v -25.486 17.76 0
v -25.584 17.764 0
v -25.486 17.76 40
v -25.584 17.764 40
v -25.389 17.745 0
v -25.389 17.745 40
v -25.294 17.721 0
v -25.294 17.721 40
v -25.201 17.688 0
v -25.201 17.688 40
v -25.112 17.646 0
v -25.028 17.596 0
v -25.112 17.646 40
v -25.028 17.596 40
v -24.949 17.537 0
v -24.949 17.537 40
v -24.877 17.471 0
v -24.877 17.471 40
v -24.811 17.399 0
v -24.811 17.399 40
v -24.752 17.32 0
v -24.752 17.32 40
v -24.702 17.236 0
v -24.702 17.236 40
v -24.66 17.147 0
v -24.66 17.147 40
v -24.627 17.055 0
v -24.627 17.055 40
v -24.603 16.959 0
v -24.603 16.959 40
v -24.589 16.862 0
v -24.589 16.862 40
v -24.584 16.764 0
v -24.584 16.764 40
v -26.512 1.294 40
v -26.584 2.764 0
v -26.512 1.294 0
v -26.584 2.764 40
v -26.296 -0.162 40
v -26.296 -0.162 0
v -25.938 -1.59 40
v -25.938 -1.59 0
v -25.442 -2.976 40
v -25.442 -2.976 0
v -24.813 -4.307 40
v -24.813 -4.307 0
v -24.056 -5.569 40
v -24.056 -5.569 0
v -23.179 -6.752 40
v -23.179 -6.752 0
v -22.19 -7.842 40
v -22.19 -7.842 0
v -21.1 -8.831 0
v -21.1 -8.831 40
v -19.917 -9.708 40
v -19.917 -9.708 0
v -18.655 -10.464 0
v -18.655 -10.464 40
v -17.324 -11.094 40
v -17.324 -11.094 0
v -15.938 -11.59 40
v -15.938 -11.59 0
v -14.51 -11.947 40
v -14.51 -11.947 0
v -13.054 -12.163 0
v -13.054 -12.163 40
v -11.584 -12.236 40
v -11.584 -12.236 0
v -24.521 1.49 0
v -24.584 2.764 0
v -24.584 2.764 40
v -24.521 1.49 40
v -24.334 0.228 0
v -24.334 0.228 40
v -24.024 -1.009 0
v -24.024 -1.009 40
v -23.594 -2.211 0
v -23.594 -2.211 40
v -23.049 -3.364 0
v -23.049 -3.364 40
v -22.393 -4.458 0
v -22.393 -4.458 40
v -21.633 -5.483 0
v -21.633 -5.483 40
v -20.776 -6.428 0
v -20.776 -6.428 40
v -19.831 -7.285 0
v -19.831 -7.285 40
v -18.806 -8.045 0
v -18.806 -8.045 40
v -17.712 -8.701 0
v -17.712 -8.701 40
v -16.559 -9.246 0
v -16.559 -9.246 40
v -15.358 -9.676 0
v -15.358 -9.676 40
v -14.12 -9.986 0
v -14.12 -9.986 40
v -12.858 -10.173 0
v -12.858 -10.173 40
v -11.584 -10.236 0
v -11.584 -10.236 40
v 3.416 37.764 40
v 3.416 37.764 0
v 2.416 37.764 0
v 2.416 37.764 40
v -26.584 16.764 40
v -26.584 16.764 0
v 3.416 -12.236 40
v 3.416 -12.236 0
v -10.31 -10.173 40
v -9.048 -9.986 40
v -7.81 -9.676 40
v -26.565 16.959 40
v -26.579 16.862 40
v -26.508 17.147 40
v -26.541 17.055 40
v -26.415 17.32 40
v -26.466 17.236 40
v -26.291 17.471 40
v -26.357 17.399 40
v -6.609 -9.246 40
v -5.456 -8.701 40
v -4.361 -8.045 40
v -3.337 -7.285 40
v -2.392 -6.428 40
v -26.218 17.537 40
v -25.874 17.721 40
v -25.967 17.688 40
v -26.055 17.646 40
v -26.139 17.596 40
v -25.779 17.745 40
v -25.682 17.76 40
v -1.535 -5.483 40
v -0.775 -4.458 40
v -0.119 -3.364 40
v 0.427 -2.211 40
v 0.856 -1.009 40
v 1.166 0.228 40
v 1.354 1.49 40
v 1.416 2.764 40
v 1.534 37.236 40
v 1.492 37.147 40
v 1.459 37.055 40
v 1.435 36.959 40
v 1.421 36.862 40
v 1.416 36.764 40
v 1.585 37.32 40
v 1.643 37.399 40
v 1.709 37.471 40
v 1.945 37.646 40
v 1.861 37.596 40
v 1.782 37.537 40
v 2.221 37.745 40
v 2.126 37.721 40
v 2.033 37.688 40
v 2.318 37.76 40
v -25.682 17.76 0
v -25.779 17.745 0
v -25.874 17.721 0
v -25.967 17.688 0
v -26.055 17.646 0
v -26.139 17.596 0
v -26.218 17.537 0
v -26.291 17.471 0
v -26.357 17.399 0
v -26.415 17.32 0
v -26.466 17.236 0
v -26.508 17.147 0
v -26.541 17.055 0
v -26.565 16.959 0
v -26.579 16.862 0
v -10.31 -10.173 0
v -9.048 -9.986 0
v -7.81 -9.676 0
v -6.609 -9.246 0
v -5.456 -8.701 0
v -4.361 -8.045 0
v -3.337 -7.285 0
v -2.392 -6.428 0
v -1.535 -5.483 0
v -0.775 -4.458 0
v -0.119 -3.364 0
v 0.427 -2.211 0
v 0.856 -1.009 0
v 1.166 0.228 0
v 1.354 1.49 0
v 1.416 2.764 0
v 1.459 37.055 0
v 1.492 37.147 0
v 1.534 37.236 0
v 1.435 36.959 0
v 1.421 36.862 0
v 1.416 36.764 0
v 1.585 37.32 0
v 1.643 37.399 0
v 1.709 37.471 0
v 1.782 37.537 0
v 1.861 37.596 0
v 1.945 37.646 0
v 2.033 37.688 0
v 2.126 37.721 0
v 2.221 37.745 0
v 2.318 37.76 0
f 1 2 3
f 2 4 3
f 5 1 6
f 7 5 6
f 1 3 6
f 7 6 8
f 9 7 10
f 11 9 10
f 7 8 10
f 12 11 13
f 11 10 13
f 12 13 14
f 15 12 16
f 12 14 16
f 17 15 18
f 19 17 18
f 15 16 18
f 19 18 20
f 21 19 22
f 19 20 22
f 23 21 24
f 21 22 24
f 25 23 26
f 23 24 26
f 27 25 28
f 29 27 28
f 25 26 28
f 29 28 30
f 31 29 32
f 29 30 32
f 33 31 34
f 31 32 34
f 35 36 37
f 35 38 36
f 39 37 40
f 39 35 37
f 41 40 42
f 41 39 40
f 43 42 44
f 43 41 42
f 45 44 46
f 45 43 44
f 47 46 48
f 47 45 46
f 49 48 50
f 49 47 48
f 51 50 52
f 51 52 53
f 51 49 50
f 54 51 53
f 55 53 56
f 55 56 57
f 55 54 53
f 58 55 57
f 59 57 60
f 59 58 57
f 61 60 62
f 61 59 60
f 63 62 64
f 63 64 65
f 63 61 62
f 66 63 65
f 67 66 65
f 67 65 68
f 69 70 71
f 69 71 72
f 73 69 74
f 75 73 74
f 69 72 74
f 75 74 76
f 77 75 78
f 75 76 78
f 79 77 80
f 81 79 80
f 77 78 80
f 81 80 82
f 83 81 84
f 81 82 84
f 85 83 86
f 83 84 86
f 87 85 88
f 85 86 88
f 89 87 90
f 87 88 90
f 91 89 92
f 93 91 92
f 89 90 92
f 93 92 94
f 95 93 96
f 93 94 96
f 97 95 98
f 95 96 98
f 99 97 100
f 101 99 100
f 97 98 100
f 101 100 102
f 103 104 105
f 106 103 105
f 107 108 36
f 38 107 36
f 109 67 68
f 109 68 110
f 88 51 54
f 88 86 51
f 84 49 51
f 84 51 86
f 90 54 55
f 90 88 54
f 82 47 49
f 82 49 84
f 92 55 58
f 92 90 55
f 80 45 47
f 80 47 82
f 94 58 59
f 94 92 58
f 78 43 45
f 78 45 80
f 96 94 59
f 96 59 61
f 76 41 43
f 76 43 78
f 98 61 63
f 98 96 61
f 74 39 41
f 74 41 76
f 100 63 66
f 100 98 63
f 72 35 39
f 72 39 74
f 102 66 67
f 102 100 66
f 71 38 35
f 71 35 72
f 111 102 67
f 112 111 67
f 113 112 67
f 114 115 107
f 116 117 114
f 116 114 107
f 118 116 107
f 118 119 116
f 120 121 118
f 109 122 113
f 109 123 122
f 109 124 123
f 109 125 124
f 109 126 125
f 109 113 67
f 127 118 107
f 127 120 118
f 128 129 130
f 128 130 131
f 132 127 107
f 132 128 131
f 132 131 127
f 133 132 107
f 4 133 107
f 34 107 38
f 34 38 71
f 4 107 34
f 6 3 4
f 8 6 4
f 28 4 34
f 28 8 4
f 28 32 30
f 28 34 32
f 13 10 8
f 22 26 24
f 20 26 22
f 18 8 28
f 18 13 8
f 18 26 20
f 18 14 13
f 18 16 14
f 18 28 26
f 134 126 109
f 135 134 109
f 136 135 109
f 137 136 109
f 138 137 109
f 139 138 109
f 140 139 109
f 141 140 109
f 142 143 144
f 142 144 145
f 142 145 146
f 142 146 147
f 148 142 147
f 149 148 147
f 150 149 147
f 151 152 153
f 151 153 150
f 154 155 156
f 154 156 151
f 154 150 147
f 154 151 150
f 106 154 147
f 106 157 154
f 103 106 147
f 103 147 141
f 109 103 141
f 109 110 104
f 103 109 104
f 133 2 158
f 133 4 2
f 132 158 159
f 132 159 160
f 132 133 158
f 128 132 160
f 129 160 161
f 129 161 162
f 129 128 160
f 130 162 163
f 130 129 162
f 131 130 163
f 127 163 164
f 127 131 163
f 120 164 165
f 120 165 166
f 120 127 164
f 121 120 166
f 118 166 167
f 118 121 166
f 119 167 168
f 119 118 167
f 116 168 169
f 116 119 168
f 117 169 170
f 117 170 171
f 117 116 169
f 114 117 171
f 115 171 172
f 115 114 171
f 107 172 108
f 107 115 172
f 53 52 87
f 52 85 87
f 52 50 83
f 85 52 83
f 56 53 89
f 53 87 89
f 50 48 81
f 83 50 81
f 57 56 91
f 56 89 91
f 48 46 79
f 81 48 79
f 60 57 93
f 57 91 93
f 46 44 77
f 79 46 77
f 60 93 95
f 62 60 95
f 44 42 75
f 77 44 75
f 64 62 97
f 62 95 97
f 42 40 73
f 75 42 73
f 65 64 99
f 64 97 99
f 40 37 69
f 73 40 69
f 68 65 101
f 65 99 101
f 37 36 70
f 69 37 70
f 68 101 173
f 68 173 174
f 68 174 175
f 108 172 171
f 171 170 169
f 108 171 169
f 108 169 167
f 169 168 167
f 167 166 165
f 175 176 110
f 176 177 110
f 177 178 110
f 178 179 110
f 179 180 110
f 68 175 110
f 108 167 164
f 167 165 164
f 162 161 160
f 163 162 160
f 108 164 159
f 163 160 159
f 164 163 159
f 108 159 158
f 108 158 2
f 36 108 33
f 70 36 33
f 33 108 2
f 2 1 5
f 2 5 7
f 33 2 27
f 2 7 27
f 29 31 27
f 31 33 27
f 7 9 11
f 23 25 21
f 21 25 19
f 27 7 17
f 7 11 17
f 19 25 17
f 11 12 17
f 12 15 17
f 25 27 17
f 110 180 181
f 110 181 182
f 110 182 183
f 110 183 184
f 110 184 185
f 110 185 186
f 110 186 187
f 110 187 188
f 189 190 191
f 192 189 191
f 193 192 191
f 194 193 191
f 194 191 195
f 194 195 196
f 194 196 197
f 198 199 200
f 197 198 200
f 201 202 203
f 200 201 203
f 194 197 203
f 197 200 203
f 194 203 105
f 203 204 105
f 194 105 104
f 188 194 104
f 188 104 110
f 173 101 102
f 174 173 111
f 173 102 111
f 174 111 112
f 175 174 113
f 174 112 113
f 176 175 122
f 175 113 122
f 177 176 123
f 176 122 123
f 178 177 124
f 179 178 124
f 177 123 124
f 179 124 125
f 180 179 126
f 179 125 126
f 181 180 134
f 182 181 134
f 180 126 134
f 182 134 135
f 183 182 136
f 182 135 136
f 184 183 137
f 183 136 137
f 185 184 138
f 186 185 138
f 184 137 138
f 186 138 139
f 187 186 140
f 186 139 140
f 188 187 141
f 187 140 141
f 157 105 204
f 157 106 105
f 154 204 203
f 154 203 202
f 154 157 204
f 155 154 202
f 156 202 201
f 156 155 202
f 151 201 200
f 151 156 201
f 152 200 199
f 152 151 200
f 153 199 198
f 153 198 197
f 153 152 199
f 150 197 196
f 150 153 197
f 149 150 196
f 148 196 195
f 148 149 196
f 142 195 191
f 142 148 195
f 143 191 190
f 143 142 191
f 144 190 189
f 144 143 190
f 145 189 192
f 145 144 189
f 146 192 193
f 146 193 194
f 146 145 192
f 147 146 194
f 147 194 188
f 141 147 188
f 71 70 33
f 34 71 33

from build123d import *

# Parameters (mm, degrees)
F0_W     = 26
F0_H     = 2
F1_DEPTH = 40
F2_R     = 0.99999
F3_R     = 12.99999
F4_R     = 15


# Not quite as in the source:
# - a fillet or chamfer is up to 0.001 mm smaller than in the source, because OpenCascade refuses the exact size


with BuildPart() as f1:
    # F0 (on Top) → F1 (new body)
    with BuildSketch(Plane.XY):
        Polygon((-24.5838956386, 17.7643506003), (-26.5838956386, 17.7643506003), (-26.5838956386, -12.2356493997), (-24.5838956386, -12.2356493997), (-24.5838956386, -10.2356493997), align=None)
        with Locations((-11.5838956386, -11.2356493997)):
            Rectangle(F0_W, F0_H)
        Polygon((1.4161043614, 37.7643506003), (1.4161043614, -10.2356493997), (1.4161043614, -12.2356493997), (3.4161043614, -12.2356493997), (3.4161043614, 37.7643506003), align=None)
    extrude(amount=F1_DEPTH)

    # F2 (radius 1 in the source; OpenCascade refuses exactly that, so slightly less here)
    f2_edges = [f1.edges().sort_by_distance(p)[0] for p in [
        (-26.583896, 17.764351, 20),
        (-24.583896, 17.764351, 20),
        (1.416104, 37.764351, 20),
    ]]
    fillet(f2_edges, radius=F2_R)

    # F3 (radius 13 in the source; OpenCascade refuses exactly that, so slightly less here)
    f3_edges = [f1.edges().sort_by_distance(p)[0] for p in [
        (1.416104, -10.235649, 20),
        (-24.583896, -10.235649, 20),
    ]]
    fillet(f3_edges, radius=F3_R)

    # F4
    f4_edges = [f1.edges().sort_by_distance(p)[0] for p in [
        (-26.583896, -12.235649, 20),
    ]]
    fillet(f4_edges, radius=F4_R)


solid = f1.part
